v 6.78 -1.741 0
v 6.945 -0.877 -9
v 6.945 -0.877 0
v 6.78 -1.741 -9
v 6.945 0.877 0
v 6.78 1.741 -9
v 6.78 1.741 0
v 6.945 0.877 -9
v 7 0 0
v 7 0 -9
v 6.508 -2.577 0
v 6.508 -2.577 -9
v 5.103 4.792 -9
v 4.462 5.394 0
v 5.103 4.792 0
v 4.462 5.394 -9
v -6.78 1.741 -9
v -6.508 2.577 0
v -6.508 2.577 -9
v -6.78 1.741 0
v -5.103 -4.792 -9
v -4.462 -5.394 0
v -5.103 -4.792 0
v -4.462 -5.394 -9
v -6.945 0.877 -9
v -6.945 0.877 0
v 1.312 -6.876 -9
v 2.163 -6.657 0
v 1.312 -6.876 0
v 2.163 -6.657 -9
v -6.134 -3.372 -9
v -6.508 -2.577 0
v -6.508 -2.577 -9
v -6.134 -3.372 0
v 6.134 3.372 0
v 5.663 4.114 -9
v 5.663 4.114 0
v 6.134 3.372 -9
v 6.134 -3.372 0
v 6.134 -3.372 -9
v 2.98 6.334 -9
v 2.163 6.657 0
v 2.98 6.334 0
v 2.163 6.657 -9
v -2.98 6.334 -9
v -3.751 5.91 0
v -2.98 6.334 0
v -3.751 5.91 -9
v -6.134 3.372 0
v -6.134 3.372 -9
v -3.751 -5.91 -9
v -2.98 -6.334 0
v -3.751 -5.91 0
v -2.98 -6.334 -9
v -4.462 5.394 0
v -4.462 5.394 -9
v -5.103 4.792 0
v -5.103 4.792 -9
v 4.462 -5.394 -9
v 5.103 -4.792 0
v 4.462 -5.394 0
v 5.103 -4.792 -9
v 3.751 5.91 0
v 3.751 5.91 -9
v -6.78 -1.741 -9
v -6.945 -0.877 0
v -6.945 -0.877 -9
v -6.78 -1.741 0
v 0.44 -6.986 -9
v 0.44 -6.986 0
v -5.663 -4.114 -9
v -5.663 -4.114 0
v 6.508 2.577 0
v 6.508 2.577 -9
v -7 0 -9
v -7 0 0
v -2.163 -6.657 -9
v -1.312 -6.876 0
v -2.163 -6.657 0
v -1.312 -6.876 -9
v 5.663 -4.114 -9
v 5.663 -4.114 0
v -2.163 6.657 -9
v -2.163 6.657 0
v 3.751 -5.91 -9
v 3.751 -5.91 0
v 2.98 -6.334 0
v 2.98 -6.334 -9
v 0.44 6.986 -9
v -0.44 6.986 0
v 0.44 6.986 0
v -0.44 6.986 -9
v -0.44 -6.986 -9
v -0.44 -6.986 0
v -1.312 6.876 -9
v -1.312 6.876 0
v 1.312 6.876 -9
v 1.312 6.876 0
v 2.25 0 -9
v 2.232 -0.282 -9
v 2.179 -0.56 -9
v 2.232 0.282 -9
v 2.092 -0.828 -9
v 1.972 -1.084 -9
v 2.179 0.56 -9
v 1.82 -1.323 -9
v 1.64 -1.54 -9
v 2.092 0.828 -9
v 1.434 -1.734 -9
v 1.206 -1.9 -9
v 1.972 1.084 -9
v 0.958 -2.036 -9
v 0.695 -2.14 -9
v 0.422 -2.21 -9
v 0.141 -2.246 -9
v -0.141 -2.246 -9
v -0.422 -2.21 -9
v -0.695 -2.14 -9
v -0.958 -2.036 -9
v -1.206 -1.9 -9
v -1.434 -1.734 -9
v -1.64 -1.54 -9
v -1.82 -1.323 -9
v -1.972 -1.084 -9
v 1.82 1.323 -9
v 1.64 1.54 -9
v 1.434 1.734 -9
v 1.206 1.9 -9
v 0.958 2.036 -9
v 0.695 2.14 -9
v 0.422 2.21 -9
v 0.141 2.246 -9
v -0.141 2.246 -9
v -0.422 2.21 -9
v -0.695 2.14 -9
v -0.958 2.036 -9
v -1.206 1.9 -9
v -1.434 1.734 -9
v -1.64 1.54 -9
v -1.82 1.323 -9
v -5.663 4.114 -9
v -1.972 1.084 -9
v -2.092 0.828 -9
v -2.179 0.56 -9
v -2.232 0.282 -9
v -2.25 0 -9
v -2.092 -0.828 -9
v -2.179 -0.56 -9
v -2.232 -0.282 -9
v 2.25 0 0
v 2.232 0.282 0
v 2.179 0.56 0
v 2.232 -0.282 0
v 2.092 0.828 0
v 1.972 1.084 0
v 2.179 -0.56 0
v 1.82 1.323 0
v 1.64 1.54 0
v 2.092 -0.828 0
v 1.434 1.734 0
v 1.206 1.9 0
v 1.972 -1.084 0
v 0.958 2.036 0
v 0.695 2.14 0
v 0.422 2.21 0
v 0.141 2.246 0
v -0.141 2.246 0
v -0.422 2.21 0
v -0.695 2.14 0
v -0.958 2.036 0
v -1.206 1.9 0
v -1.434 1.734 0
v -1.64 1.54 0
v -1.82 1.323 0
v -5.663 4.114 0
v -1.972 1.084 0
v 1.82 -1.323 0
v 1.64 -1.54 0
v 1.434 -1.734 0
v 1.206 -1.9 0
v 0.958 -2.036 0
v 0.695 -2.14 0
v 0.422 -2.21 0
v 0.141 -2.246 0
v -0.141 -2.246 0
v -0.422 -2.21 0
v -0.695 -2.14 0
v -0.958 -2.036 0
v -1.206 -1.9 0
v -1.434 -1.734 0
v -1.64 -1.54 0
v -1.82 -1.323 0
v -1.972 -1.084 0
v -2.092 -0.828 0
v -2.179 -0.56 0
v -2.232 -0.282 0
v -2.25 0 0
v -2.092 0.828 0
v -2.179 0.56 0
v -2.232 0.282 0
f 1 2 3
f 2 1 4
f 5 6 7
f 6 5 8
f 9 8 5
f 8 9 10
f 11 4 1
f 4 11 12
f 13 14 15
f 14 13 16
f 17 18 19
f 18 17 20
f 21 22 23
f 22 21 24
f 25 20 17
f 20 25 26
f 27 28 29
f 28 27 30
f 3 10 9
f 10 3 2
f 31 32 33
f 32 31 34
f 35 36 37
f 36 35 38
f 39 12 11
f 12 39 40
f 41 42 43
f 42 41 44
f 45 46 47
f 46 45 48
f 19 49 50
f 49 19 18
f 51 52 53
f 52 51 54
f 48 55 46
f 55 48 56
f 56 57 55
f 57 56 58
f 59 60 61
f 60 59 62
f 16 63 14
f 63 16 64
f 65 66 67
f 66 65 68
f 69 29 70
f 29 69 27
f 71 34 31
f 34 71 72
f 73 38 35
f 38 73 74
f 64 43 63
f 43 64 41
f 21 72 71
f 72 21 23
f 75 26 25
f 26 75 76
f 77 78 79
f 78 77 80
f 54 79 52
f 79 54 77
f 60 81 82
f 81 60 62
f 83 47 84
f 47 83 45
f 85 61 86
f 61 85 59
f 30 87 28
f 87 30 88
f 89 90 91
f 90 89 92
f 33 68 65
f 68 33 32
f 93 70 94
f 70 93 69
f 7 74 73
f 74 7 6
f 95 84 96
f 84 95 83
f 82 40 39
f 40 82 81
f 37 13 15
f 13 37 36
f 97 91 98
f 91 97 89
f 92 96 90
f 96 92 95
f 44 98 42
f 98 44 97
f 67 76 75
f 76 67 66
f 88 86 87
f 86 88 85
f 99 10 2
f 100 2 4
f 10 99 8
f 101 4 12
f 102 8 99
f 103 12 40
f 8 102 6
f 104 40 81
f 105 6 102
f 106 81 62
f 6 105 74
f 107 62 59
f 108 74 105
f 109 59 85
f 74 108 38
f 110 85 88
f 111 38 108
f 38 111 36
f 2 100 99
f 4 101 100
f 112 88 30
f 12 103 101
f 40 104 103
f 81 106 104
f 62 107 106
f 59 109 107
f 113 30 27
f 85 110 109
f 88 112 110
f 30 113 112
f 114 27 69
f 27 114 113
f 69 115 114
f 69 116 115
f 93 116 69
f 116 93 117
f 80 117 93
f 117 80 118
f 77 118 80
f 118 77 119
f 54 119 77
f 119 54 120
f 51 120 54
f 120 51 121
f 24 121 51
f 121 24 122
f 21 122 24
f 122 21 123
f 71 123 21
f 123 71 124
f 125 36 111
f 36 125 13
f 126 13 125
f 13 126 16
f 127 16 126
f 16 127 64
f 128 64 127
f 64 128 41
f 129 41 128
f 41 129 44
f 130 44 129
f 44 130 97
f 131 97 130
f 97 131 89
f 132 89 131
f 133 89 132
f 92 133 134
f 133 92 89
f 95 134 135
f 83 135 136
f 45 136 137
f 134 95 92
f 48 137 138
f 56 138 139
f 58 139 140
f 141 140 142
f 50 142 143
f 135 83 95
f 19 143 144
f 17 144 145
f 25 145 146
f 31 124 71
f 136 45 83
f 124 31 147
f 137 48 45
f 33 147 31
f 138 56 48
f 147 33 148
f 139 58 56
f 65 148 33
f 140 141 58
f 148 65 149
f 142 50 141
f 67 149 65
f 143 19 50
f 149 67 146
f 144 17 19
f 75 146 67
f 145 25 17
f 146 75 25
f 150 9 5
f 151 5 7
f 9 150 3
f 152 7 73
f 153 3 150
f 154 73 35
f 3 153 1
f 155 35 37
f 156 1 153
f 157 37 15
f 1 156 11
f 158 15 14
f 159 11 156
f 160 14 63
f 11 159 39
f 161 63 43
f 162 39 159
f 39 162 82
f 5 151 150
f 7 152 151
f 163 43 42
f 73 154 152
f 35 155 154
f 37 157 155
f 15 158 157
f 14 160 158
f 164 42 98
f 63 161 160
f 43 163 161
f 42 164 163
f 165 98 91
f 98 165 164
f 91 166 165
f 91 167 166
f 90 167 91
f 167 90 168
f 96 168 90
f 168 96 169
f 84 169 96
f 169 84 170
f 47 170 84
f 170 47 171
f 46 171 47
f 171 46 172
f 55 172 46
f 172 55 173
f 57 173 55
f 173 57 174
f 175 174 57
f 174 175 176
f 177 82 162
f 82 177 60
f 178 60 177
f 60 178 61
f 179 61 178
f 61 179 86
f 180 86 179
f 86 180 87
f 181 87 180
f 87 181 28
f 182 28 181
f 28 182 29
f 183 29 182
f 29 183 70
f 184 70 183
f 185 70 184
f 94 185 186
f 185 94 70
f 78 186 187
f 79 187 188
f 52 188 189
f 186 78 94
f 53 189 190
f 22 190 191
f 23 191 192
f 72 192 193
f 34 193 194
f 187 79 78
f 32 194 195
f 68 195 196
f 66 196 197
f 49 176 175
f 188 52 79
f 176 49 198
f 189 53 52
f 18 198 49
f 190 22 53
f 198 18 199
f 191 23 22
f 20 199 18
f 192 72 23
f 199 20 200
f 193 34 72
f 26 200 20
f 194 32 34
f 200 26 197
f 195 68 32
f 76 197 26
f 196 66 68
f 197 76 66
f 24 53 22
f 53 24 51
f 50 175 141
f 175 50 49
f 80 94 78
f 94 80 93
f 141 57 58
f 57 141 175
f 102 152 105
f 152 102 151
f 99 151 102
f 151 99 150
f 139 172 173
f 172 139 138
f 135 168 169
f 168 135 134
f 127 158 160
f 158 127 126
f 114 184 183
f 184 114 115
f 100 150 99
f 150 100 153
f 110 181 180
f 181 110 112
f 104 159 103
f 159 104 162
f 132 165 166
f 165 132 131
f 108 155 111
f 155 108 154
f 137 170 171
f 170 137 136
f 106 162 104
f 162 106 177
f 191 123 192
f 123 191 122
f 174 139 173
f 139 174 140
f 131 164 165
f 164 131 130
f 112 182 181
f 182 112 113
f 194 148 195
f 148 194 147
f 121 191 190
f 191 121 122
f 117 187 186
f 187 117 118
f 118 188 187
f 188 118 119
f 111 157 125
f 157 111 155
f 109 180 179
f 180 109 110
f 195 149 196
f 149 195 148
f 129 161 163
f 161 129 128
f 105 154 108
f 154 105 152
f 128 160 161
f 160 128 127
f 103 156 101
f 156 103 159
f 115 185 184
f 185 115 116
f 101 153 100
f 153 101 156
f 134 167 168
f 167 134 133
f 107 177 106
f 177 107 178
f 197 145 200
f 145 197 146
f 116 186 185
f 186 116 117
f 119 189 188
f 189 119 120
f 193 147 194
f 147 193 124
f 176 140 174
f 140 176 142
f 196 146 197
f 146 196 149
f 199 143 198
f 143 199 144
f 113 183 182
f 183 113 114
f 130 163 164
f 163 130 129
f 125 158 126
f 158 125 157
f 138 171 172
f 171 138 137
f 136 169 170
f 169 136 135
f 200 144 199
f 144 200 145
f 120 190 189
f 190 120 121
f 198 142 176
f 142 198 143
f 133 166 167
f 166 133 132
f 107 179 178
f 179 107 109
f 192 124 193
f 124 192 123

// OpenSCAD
$fn = 50;


difference() {
	union() {
		translate(v = [0, 0, -9.0000000000]) {
			cylinder(h = 9, r = 7.0000000000);
		}
		cylinder(h = 0, r = 13.0000000000);
	}
	union() {
		#translate(v = [0, 0, -9]) {
			cylinder(h = 9, r = 2.2500000000);
		}
	}
}
